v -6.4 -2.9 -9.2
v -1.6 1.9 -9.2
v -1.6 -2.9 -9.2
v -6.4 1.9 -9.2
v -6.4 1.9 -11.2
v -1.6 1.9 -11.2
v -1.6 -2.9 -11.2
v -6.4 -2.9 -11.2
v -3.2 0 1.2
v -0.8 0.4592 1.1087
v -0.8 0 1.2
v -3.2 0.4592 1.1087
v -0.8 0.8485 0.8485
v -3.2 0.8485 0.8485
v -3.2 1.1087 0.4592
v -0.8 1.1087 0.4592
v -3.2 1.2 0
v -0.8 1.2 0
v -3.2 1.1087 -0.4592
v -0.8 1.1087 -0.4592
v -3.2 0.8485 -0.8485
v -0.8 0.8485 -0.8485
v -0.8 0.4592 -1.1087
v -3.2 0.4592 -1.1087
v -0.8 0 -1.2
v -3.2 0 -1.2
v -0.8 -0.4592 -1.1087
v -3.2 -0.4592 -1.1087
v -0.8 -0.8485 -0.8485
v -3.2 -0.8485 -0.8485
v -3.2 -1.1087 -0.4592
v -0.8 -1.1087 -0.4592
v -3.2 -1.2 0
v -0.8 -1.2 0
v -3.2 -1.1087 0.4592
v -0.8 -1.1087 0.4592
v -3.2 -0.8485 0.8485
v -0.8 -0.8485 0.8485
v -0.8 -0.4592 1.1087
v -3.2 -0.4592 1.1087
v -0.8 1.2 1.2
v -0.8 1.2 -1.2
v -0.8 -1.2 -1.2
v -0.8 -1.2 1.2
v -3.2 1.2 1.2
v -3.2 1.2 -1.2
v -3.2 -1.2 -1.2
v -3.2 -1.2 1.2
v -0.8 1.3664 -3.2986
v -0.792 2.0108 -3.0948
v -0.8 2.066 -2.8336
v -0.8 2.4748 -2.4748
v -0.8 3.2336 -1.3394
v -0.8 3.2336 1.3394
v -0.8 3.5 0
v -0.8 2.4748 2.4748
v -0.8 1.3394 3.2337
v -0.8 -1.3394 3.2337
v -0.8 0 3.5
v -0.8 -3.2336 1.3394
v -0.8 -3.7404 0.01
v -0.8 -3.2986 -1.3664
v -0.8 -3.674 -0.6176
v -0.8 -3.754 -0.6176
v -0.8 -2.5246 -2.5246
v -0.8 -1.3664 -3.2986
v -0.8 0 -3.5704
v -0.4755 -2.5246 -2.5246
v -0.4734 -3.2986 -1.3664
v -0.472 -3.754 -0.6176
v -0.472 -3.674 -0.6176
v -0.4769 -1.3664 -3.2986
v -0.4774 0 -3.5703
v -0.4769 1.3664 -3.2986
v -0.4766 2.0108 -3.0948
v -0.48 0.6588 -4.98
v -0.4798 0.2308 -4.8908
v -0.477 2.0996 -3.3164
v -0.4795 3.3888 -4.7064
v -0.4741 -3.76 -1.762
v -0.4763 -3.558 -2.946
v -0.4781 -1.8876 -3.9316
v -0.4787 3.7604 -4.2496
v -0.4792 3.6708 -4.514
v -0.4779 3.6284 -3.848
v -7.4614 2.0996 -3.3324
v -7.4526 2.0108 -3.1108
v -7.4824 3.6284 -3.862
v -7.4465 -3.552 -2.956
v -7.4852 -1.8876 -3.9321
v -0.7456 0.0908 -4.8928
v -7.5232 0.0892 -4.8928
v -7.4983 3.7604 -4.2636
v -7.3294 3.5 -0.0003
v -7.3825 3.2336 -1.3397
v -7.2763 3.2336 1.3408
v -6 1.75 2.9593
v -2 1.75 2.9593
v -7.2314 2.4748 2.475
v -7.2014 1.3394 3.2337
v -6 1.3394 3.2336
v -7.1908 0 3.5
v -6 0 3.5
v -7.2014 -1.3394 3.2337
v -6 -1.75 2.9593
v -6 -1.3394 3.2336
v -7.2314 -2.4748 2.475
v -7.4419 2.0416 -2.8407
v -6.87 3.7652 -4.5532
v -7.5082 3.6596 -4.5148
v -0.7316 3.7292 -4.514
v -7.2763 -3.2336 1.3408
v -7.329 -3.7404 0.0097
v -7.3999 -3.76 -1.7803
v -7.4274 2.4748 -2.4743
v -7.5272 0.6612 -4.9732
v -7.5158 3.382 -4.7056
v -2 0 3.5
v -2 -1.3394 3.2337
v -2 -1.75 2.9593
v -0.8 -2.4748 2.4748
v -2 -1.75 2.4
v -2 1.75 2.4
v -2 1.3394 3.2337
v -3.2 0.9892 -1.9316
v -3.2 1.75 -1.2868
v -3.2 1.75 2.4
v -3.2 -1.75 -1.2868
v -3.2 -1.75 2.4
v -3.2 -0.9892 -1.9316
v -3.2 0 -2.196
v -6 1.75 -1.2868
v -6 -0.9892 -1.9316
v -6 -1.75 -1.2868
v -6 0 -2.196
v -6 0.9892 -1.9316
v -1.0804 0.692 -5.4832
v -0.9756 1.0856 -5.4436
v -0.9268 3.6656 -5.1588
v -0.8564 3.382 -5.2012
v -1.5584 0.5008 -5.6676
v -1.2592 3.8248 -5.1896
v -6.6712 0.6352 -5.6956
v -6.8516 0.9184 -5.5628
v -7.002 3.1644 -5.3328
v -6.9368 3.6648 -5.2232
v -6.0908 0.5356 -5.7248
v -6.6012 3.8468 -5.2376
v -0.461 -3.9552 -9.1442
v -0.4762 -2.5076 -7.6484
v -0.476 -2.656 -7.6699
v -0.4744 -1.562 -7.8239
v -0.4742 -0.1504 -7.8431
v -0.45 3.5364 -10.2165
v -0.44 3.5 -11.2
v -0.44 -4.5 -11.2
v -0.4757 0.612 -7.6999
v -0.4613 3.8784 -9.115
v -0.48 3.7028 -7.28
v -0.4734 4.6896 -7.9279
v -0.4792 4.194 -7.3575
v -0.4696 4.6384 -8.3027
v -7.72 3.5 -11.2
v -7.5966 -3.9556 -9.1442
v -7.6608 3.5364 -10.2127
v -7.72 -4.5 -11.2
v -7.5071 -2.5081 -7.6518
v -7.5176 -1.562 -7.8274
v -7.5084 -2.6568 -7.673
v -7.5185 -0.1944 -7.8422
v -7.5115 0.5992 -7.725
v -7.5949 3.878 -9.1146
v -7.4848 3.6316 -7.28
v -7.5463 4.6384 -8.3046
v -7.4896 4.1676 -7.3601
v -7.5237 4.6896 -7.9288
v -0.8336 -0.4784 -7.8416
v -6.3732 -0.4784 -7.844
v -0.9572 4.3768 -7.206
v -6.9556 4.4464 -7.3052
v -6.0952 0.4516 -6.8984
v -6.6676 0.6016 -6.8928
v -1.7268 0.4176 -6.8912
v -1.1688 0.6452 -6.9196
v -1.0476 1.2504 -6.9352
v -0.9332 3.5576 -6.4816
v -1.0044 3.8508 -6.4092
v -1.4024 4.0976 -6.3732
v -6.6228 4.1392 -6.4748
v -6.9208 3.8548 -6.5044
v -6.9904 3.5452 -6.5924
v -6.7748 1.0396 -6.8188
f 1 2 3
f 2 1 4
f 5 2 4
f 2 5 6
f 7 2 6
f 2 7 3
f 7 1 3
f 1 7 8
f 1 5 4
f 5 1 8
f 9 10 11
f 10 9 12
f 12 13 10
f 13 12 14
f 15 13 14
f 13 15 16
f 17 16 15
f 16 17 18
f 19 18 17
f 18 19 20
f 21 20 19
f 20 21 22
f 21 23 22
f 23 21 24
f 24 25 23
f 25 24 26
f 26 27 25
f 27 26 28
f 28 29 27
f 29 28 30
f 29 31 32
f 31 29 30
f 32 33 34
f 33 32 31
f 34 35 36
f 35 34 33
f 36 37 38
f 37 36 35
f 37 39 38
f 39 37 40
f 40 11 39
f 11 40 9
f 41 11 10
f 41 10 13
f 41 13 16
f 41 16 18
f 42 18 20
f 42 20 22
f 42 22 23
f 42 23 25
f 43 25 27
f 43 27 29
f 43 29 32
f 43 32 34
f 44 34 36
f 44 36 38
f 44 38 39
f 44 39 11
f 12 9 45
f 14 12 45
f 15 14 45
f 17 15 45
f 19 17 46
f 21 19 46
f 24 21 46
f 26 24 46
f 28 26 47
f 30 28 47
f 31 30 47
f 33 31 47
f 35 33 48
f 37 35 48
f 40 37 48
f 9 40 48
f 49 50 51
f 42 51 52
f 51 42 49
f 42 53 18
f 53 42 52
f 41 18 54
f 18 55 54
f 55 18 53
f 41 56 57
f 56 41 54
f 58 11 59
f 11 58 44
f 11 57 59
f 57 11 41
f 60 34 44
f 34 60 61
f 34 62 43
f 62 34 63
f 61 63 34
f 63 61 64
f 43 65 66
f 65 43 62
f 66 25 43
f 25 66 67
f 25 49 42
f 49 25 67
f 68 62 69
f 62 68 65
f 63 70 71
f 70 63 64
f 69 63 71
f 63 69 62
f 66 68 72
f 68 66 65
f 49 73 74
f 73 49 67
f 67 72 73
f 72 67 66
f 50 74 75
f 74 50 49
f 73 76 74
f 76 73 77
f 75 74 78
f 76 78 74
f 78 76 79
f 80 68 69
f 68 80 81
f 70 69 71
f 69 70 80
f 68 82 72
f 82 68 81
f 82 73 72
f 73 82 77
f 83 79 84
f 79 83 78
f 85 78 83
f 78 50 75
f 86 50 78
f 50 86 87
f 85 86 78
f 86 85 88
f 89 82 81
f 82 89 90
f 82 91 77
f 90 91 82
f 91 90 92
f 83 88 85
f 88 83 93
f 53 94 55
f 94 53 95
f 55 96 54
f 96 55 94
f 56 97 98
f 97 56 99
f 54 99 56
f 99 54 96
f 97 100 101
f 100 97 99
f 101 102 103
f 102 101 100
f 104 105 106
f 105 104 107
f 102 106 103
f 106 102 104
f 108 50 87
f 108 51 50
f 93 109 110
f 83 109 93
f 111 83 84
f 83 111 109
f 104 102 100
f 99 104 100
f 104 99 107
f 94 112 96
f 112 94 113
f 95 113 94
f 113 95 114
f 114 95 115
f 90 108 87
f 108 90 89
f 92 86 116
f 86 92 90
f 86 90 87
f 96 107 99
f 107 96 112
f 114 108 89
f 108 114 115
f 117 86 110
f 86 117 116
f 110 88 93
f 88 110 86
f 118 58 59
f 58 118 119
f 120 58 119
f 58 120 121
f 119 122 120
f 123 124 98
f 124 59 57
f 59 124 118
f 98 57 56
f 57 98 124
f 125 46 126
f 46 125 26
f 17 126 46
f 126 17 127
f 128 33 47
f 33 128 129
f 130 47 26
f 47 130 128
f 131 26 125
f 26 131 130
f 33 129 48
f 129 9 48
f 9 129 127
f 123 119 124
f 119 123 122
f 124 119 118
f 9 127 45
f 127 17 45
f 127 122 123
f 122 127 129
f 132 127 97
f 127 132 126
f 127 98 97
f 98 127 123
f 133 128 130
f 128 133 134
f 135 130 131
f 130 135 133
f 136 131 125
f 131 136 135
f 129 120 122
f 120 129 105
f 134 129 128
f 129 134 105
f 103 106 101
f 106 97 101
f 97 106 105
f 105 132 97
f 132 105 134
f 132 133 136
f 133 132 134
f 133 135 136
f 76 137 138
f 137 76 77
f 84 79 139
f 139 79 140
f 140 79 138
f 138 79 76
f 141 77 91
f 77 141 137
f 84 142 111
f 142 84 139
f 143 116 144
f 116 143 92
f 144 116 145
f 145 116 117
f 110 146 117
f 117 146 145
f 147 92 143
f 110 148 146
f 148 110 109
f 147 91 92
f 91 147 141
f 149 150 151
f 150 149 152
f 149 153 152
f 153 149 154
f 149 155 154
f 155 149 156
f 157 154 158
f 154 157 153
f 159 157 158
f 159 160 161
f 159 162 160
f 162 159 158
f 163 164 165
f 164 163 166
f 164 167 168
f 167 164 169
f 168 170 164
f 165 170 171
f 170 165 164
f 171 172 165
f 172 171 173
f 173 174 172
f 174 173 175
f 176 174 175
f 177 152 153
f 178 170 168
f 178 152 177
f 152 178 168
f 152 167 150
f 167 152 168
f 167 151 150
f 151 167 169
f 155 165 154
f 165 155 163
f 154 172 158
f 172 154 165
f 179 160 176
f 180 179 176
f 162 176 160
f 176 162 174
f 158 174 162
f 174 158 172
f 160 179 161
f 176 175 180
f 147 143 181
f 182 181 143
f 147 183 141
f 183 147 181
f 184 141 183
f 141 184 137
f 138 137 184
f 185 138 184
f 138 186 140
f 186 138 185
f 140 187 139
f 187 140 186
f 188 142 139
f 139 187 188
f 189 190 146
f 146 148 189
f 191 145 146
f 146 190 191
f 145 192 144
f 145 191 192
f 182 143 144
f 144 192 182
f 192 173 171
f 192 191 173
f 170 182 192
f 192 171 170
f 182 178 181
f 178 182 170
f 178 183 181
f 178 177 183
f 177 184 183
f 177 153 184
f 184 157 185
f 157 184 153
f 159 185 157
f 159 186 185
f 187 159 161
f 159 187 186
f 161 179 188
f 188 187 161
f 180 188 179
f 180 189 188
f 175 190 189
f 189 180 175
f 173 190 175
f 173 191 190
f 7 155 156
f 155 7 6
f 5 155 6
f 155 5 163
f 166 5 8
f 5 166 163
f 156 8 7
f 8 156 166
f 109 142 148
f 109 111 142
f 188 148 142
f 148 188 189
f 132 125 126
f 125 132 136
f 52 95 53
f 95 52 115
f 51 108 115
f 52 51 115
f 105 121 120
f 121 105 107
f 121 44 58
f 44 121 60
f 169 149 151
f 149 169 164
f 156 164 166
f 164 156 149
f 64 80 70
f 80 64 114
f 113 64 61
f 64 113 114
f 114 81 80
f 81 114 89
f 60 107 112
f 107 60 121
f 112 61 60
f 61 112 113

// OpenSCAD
use <../lib.scad>
use <24083.scad>
function ldraw_lib__24082() = [
// 0 Minifig Leg Faun Right
// 0 Name: 24082.dat
// 0 Author: Magnus Forsberg [MagFors]
// 0 !LDRAW_ORG Part UPDATE 2023-02
// 0 !LICENSE Licensed under CC BY 4.0 : see CAreadme.txt
// 
// 0 !HELP Move down 12 units to align with hips
// 
// 0 BFC CERTIFY CCW
  [0,"BFC","CERTIFY"],
  [0,"BFC","CCW"],
// 
// 0 !HISTORY 2016-03-18 {LEGO Digital Designer} Original part shape
// 0 !HISTORY 2019-06-05 [MagFors] File preparation for LDraw Parts Tracker
// 0 !HISTORY 2023-04-17 [OrionP] Official Update 2023-02
// 
// 
// 1 16 0 0 0 -1 0 0 0 1 0 0 0 1 24083.dat
  [1,16,0,0,0,-1,0,0,0,1,0,0,0,1, ldraw_lib__24083()],
];
module ldraw_lib__24082(step=0, col=false, unit=2/5, alt=false, line=0.2, solid=!$preview)
    makepoly(ldraw_lib__24082(), step=step, col=col, unit=unit, alt=alt, line=line, solid=solid);
ldraw_lib__24082(line=0.2);
